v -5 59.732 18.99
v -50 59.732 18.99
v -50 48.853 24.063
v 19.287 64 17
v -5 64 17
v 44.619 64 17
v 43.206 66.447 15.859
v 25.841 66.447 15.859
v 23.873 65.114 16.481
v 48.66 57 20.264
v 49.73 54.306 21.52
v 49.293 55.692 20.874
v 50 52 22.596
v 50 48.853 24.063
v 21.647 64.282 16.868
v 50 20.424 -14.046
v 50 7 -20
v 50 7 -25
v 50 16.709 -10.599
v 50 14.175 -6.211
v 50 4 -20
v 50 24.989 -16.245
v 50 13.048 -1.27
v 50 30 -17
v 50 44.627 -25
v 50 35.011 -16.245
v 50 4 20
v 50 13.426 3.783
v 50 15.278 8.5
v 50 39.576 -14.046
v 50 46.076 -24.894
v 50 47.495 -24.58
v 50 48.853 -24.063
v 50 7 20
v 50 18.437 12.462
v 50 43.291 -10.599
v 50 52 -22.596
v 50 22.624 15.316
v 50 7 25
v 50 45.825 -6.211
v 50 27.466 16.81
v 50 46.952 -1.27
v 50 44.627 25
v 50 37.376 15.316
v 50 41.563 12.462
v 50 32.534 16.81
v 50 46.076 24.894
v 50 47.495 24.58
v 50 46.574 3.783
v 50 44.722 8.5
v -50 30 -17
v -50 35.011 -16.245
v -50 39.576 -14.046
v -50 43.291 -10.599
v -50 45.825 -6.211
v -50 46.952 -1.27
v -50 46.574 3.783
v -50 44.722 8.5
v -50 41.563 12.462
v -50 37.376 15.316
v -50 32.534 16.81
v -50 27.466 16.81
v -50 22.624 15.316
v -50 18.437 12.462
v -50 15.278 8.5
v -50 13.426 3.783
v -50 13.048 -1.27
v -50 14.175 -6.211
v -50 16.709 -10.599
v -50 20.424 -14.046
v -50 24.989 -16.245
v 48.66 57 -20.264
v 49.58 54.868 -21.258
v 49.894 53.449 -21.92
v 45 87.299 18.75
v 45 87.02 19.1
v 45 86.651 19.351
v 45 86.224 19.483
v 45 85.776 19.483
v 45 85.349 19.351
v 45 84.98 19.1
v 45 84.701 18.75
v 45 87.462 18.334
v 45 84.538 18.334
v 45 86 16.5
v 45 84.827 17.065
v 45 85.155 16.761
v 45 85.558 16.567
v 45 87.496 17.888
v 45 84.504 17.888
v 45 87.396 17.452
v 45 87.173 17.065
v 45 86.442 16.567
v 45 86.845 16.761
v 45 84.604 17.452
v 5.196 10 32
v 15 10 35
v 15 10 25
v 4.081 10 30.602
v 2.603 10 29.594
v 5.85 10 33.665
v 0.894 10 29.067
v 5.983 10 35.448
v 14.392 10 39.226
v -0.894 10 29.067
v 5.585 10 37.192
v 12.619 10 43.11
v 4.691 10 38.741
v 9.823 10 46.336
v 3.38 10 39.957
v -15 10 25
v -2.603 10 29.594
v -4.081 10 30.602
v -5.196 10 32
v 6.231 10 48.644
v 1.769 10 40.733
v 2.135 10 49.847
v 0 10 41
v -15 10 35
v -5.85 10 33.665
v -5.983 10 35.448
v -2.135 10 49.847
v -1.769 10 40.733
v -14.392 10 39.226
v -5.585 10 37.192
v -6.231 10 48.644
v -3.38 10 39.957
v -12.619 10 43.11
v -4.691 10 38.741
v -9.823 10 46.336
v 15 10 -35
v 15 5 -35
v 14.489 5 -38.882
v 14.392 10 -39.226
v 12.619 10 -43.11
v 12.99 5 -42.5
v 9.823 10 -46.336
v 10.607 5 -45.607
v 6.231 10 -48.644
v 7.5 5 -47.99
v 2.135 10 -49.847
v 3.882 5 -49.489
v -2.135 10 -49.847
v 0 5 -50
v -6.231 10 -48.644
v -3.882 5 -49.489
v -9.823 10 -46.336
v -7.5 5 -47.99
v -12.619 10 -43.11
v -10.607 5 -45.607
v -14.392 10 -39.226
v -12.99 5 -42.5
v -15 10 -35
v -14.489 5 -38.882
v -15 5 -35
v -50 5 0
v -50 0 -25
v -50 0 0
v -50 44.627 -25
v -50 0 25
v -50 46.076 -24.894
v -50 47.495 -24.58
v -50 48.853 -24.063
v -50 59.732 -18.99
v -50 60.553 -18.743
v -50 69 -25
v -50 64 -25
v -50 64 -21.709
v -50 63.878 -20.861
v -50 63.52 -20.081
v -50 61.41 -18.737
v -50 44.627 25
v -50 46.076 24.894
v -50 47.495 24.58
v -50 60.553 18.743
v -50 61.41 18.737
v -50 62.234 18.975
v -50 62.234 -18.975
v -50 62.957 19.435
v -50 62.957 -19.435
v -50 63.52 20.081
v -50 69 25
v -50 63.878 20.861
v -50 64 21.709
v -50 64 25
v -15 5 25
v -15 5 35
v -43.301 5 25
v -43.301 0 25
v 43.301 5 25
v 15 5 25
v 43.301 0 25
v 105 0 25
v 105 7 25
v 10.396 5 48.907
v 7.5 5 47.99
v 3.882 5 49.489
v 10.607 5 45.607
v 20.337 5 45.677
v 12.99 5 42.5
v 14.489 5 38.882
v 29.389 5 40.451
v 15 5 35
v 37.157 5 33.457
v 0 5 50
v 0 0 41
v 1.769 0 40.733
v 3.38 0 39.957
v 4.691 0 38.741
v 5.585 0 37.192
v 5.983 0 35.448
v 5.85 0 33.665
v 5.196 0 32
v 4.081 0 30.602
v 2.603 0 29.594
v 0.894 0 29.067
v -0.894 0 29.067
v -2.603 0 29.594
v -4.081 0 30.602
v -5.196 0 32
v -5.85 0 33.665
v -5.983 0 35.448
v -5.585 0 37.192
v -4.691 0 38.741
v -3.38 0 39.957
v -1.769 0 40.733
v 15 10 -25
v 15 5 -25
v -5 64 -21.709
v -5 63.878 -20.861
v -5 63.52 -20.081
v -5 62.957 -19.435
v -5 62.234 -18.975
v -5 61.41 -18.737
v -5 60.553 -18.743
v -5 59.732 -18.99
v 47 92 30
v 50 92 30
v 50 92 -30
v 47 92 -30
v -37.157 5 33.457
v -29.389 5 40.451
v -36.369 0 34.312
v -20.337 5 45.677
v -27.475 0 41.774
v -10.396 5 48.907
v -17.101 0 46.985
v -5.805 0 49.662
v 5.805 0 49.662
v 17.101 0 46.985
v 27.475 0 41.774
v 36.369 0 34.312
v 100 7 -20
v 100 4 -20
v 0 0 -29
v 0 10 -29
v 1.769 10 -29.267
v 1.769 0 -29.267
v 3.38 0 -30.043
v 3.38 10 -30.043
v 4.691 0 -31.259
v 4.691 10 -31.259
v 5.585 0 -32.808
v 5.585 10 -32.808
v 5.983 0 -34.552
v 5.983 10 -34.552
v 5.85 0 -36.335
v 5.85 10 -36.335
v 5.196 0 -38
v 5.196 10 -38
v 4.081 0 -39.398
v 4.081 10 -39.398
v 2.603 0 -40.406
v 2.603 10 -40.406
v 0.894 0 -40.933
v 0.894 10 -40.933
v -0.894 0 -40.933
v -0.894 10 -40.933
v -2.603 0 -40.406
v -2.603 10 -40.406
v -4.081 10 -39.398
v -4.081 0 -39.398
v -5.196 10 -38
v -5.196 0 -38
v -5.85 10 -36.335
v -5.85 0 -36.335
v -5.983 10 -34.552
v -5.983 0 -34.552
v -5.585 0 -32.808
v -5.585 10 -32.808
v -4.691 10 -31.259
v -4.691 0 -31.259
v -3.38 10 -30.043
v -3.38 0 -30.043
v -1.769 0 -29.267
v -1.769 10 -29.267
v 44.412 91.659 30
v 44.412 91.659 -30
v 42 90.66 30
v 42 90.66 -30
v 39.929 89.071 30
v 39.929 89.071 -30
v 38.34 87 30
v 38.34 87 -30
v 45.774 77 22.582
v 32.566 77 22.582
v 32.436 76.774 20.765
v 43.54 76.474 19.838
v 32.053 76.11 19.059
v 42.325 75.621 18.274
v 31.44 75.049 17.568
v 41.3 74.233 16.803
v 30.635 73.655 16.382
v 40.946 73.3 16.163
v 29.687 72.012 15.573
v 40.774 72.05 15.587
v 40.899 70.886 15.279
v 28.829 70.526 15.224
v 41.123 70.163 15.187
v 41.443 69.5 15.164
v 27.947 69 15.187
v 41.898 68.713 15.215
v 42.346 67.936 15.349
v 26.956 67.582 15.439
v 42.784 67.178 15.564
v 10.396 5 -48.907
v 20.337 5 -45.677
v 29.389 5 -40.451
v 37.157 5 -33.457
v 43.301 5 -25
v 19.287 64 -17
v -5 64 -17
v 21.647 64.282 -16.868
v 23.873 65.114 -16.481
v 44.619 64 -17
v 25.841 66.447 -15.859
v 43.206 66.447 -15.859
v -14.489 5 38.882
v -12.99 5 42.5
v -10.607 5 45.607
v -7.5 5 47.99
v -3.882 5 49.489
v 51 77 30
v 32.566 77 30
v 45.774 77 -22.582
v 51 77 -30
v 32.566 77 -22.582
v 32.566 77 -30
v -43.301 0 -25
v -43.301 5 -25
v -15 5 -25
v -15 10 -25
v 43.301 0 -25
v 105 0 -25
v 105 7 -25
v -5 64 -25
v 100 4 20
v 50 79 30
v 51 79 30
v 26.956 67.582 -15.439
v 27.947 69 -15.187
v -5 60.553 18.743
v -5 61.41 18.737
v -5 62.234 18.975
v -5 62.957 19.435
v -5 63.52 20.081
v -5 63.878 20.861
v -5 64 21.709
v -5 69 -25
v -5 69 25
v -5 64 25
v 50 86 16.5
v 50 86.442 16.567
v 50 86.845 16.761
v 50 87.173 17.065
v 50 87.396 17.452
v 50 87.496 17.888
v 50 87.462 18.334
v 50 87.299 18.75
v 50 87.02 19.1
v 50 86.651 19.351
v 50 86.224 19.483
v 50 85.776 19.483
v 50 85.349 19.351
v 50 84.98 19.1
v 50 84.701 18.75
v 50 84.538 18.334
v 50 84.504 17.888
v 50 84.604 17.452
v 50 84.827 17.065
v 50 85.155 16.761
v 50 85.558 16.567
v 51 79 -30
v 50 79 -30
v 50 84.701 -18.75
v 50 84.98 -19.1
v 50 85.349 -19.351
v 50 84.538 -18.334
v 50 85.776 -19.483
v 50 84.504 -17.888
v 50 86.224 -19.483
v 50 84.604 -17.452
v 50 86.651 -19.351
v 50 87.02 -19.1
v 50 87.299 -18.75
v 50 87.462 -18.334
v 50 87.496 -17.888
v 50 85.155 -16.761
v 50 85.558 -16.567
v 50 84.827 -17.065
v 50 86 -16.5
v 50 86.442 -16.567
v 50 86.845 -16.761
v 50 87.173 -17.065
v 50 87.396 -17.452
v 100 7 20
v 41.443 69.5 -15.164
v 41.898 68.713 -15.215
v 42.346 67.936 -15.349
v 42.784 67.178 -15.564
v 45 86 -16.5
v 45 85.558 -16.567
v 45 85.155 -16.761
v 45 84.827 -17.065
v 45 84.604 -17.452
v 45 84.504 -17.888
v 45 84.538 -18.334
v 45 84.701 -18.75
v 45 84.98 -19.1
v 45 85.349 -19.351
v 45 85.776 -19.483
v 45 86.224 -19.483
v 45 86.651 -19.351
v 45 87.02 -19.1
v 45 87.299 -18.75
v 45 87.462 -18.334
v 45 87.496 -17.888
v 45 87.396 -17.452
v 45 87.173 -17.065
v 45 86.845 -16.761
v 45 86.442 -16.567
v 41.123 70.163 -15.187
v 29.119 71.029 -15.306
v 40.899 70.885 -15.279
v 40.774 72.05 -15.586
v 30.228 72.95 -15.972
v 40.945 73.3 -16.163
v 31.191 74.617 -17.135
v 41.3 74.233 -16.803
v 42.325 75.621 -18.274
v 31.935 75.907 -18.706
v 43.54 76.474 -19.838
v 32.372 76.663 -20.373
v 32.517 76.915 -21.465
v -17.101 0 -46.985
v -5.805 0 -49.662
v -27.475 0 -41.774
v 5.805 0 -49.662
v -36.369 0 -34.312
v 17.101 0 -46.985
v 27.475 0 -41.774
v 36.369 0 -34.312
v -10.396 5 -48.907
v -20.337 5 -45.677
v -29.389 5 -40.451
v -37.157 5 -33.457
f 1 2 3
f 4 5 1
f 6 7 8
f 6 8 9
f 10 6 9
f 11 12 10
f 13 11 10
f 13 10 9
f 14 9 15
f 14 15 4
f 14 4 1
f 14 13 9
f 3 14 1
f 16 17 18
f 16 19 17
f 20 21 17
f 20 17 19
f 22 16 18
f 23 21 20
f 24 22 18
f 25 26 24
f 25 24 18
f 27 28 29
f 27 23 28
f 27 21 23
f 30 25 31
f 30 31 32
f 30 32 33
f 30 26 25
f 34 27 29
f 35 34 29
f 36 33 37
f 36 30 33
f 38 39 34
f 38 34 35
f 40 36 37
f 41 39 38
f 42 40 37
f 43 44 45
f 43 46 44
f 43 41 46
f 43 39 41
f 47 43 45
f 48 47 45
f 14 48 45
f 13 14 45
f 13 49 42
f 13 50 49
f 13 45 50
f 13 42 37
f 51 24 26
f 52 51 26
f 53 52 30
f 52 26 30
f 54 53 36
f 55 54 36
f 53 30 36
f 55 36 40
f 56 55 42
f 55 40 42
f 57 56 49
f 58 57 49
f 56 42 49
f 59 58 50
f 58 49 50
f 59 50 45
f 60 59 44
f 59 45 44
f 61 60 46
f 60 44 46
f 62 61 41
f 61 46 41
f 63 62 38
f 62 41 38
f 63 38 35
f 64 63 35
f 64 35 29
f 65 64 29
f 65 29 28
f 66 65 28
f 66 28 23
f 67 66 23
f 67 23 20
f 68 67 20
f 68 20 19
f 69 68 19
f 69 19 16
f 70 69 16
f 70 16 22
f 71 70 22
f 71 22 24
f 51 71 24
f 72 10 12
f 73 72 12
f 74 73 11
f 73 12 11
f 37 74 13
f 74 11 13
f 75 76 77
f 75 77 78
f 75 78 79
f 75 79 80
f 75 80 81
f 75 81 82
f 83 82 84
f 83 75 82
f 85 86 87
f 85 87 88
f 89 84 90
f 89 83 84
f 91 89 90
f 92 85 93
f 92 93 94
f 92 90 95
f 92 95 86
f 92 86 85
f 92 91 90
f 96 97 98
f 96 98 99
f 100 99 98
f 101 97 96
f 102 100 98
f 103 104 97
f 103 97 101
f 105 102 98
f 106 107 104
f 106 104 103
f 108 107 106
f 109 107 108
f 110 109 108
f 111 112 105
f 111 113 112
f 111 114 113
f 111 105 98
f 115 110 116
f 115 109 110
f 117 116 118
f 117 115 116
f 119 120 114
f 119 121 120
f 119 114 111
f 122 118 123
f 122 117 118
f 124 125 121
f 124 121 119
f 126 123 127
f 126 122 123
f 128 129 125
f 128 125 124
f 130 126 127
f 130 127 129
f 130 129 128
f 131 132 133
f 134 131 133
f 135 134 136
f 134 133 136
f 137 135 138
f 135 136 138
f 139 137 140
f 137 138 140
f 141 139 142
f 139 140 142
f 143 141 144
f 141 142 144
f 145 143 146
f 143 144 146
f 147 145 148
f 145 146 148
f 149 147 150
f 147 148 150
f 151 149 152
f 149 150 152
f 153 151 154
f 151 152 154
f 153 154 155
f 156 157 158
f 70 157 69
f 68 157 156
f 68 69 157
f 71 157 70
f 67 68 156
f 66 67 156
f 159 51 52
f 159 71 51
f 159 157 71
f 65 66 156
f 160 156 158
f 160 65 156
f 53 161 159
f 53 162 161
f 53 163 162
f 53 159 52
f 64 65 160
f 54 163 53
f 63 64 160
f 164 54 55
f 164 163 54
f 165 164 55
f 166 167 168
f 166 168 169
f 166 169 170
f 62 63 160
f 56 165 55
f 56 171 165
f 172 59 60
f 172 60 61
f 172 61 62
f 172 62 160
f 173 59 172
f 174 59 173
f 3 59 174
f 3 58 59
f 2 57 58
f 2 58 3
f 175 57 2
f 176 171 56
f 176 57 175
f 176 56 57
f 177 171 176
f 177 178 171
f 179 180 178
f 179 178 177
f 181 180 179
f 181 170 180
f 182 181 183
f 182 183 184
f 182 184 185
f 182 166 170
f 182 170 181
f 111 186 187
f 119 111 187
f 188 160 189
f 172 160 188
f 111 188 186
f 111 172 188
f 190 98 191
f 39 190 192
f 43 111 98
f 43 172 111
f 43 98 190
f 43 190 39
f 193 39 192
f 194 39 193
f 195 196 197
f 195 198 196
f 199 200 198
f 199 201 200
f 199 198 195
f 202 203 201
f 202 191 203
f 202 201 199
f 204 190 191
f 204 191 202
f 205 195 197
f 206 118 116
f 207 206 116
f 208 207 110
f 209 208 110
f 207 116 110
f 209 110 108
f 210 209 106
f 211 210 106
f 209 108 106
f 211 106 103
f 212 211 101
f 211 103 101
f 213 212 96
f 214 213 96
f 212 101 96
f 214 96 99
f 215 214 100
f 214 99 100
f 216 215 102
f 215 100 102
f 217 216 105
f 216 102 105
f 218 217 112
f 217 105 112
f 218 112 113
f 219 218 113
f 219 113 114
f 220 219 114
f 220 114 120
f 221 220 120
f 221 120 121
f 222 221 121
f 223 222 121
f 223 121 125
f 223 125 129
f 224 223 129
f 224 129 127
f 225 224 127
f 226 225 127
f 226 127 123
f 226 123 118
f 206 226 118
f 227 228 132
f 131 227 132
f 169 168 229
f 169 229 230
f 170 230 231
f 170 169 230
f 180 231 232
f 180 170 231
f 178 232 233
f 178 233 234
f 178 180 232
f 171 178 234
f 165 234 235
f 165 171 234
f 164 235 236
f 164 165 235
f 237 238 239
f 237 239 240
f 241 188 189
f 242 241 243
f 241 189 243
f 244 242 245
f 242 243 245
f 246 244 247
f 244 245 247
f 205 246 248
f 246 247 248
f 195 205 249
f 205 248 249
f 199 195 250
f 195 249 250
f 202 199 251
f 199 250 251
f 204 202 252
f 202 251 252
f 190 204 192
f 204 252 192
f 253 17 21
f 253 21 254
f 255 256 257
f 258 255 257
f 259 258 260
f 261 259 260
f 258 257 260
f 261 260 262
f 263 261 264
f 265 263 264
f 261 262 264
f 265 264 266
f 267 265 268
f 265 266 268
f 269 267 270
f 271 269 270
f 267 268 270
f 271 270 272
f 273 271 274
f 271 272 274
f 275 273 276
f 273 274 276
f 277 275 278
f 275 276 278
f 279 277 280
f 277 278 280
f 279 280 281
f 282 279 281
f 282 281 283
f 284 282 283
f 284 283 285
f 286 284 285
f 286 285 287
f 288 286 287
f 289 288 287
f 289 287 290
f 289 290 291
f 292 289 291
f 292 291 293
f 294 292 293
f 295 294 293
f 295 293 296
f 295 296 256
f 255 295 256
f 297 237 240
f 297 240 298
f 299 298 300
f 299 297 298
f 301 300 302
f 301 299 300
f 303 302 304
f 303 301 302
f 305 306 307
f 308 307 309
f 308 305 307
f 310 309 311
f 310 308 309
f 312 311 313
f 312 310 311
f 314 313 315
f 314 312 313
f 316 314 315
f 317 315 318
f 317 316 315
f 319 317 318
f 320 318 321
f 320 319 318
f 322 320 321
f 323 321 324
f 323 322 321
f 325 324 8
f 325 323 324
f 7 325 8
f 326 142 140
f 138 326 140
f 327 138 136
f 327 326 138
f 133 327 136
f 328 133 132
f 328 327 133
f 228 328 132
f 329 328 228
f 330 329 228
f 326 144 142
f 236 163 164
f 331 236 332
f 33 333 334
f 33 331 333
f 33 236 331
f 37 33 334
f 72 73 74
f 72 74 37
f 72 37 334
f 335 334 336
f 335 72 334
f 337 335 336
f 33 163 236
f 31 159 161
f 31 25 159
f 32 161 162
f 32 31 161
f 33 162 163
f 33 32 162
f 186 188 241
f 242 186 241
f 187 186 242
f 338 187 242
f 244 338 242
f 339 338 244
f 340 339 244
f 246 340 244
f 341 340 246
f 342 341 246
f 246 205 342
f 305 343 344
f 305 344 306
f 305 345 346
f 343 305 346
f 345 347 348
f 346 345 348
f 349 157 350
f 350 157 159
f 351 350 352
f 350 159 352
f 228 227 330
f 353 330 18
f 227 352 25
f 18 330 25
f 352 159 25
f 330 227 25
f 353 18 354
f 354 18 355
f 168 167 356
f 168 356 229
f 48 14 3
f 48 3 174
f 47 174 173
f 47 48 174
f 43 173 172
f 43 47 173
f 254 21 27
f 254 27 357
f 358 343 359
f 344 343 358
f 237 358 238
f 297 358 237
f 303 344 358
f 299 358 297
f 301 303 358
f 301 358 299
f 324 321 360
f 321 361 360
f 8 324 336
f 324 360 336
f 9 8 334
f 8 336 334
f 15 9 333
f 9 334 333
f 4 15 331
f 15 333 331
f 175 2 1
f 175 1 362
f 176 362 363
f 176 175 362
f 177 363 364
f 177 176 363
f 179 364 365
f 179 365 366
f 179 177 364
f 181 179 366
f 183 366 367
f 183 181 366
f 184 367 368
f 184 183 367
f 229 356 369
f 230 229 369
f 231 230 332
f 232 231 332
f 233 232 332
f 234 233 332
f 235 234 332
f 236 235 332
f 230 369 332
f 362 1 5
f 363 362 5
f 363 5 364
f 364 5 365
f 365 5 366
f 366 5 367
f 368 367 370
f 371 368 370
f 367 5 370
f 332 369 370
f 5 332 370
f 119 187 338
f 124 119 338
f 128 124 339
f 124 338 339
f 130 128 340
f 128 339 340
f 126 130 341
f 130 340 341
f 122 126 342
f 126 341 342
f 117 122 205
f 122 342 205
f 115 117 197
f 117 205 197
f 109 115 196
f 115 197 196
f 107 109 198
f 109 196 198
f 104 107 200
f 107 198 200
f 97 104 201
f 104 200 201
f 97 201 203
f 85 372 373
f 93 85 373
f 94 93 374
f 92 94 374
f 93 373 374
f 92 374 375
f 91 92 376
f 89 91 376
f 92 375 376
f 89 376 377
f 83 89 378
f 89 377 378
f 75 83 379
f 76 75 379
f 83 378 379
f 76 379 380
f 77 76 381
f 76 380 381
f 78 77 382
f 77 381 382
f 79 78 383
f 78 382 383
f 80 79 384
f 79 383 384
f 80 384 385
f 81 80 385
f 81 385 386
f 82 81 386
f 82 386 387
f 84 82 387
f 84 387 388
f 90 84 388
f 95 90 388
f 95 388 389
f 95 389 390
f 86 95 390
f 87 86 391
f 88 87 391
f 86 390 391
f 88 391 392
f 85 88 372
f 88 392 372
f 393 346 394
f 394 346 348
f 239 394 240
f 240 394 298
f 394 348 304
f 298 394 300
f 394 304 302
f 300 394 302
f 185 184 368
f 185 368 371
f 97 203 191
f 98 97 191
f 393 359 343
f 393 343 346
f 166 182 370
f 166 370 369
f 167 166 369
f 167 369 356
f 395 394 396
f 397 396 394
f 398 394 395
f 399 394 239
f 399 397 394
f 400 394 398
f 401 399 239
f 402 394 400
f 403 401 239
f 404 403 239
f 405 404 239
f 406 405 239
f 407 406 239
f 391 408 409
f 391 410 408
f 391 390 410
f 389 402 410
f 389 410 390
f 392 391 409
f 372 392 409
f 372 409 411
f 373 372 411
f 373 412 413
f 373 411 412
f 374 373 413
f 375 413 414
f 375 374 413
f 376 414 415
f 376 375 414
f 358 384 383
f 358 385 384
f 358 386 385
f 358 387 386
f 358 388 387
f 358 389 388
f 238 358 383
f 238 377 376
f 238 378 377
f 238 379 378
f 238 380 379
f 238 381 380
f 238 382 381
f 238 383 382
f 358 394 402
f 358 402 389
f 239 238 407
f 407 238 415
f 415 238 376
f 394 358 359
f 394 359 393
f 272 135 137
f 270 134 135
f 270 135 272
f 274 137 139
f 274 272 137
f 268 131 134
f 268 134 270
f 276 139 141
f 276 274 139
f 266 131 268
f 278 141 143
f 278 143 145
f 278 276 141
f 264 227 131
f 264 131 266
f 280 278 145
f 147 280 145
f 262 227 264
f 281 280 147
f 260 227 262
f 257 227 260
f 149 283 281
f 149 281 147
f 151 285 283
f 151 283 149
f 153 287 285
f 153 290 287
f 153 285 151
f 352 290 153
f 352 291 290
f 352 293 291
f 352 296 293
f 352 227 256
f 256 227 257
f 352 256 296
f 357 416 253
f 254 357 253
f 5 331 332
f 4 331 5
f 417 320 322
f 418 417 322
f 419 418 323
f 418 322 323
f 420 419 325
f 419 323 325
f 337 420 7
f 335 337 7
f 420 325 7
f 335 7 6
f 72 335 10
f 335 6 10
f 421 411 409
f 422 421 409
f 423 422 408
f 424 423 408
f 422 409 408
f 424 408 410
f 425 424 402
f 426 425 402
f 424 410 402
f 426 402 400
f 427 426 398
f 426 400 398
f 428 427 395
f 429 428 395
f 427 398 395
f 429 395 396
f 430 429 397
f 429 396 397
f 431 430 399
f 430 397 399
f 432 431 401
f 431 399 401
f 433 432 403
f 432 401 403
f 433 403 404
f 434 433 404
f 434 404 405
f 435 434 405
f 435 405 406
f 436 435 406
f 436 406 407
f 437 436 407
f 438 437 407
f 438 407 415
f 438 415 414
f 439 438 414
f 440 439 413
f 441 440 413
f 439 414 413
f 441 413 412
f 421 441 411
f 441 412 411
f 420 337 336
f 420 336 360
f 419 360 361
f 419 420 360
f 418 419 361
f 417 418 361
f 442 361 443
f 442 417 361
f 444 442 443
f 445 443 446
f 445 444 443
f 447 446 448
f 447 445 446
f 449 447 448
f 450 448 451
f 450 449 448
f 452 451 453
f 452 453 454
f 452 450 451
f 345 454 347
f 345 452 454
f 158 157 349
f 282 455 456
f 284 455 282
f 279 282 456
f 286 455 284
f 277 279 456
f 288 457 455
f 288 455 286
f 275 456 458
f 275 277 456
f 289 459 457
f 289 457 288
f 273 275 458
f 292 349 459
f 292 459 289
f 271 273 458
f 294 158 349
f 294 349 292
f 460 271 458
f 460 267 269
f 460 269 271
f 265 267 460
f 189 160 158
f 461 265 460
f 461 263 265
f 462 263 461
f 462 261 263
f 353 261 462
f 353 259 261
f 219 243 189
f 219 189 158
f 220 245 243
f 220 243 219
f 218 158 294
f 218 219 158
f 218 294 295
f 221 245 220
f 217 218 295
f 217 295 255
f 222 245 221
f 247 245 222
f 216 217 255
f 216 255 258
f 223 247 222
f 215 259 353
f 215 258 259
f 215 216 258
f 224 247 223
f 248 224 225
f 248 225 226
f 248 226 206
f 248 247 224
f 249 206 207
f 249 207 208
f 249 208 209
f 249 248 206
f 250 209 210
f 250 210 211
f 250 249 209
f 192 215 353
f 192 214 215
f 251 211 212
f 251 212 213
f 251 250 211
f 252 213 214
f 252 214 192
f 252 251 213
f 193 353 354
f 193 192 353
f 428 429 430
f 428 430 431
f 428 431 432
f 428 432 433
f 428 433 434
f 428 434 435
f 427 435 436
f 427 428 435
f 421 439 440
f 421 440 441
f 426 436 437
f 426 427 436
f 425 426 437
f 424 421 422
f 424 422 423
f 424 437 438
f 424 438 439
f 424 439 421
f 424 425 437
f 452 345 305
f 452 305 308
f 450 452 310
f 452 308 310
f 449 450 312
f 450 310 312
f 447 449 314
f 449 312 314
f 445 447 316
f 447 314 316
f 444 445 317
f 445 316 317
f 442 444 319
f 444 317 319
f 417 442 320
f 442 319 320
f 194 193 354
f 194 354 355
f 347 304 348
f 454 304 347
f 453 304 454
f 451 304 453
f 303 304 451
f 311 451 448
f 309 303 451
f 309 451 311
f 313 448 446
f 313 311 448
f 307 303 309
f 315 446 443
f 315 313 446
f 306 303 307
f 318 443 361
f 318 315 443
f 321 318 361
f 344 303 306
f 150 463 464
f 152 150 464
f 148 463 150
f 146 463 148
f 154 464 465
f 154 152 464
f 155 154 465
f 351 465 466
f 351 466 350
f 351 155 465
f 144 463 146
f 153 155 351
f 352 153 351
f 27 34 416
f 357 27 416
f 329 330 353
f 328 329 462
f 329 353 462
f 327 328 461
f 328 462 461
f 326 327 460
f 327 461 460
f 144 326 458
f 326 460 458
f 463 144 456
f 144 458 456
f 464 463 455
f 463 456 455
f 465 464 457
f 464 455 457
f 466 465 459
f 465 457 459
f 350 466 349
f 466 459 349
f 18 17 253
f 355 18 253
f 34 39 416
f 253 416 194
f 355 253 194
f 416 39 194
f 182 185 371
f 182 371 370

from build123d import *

# Parameters (mm, degrees)
SKETCH17_R          = 50
BOSS_EXTRUDE9_DEPTH = 5
BOSS_EXTRUDE1_DEPTH = 5
SKETCH3_R           = 6
CUT_EXTRUDE1_DEPTH  = 11
BOSS_EXTRUDE3_DEPTH = 50
BOSS_EXTRUDE7_DEPTH = 45
SKETCH6_W           = 55
SKETCH6_H           = 7
BOSS_EXTRUDE4_DEPTH = 50
BOSS_EXTRUDE5_DEPTH = 30
CUT_EXTRUDE2_DEPTH  = 81
CUT_EXTRUDE4_REACH  = 102
SKETCH12_W          = 60
SKETCH12_H          = 2
BOSS_EXTRUDE6_DEPTH = 1
SKETCH14_R          = 17
CUT_EXTRUDE7_DEPTH  = 101
SKETCH15_R          = 1.5
CUT_EXTRUDE8_DEPTH  = 5
SKETCH18_W          = 50
SKETCH18_H          = 40
CUT_EXTRUDE9_DEPTH  = 3
FILLET1_R           = 10


with BuildPart() as part:
    # Sketch17 → Boss-Extrude9 (new body)
    with BuildSketch(Plane(origin=(0, 0, 0), x_dir=(1, 0, 0), z_dir=(0, 1, 0))):
        with Locations(Location((0, 0, 0), (0, 0, 270))):  # turned: the seam where the file's is
            Circle(SKETCH17_R)
    extrude(amount=BOSS_EXTRUDE9_DEPTH)

    # Sketch2 → Boss-Extrude1 (add)
    with BuildSketch(Plane.XZ.offset(-5)):
        with BuildLine():
            Line((-15, -35), (-15, 35))
            ThreePointArc((-15, 35), (0, 50), (15, 35))
            Line((15, 35), (15, -35))
            ThreePointArc((15, -35), (0, -50), (-15, -35))
        make_face()
    extrude(amount=-BOSS_EXTRUDE1_DEPTH)

    # Sketch3 → Cut-Extrude1 (cut, through all)
    with BuildSketch(Plane(origin=(0, 10, 0), x_dir=(1, 0, 0), z_dir=(0, 1, 0))):
        with Locations(Location((0, 35, 0), (0, 0, 270))):  # turned: the seam where the file's is
            Circle(SKETCH3_R)
        with Locations(Location((0, -35, 0), (0, 0, 270))):  # turned: the seam where the file's is
            Circle(SKETCH3_R)
    extrude(amount=-CUT_EXTRUDE1_DEPTH, mode=Mode.SUBTRACT)

    # Sketch5 → Boss-Extrude3 (add, symmetric)
    with BuildSketch(Plane(origin=(0, 0, 0), x_dir=(0, 0, -1), z_dir=(1, 0, 0))):
        with BuildLine():
            Line((17, 64), (-17, 64))
            Line((-17, 64), (-24.06307787, 48.853180627))
            ThreePointArc((-24.06307787, 48.853180627), (-24.762960071, 46.791394149), (-25, 44.626998009))
            Line((-25, 44.626998009), (-25, 0))
            Line((-25, 0), (25, 0))
            Line((25, 0), (25, 44.626998009))
            ThreePointArc((25, 44.626998009), (24.762960071, 46.791394149), (24.06307787, 48.853180627))
            Line((24.06307787, 48.853180627), (17, 64))
        make_face()
    extrude(amount=BOSS_EXTRUDE3_DEPTH, both=True)

    # Sketch4 → Boss-Extrude7 (add)
    with BuildSketch(Plane(origin=(-50, 0, 0), x_dir=(0, 0, -1), z_dir=(1, 0, 0))):
        with BuildLine():
            Line((-17, 64), (-18.99013337, 59.732145215))
            ThreePointArc((-18.99013337, 59.732145215), (-19.178882394, 62.611898825), (-21.709056731, 64))
            Line((-21.709056731, 64), (-25, 64))
            Line((-25, 64), (-25, 69))
            Line((-25, 69), (25, 69))
            Line((25, 69), (25, 64))
            Line((25, 64), (21.709056731, 64))
            ThreePointArc((21.709056731, 64), (19.178882394, 62.611898825), (18.99013337, 59.732145215))
            Line((18.99013337, 59.732145215), (17, 64))
            Line((17, 64), (-17, 64))
        make_face()
    extrude(amount=BOSS_EXTRUDE7_DEPTH)

    # Sketch6 → Boss-Extrude4 (add)
    with BuildSketch(Plane.XY.offset(25)):
        with Locations((77.5, 3.5)):
            Rectangle(SKETCH6_W, SKETCH6_H)
    extrude(amount=-BOSS_EXTRUDE4_DEPTH)

    # Sketch7 → Boss-Extrude5 (add, symmetric)
    with BuildSketch(Plane.XY):
        with BuildLine():
            Line((50, 64), (50, 92))
            Line((50, 92), (47, 92))
            ThreePointArc((47, 92), (42, 90.660254038), (38.339745962, 87))
            Line((38.339745962, 87), (25.060689771, 64))
            Line((25.060689771, 64), (50, 64))
        make_face()
    extrude(amount=BOSS_EXTRUDE5_DEPTH, both=True)

    # Sketch8 → Cut-Extrude2 (cut, through all)
    with BuildSketch(Plane.XY.offset(30)):
        with BuildLine():
            Line((50, 52), (50, 77))
            Line((50, 77), (45.773502692, 77))
            ThreePointArc((45.773502692, 77), (41.443375673, 74.5), (41.443375673, 69.5))
            Line((41.443375673, 69.5), (48.660254038, 57))
            ThreePointArc((48.660254038, 57), (49.659258263, 54.588190451), (50, 52))
        make_face()
    extrude(amount=-CUT_EXTRUDE2_DEPTH, mode=Mode.SUBTRACT)

    # Sketch10 → Cut-Extrude4 (cut, up to next)
    with BuildSketch(Plane(origin=(50, 0, 0), x_dir=(0, 0, -1), z_dir=(1, 0, 0)), mode=Mode.PRIVATE) as cut_extrude4_sk1:
        with BuildLine():
            Line((30, 77), (30, 36.121410033))
            Line((30, 36.121410033), (15.858955464, 66.446977905))
            ThreePointArc((15.858955464, 66.446977905), (16.325670644, 73.56767554), (22.581972002, 77))
            Line((22.581972002, 77), (30, 77))
        make_face()
    cut_extrude4_tool1 = extrude(cut_extrude4_sk1.sketch, amount=-CUT_EXTRUDE4_REACH, mode=Mode.PRIVATE) & part.part
    add(cut_extrude4_tool1.solids().sort_by_distance((50, 62.410473, -24.403719))[0], mode=Mode.SUBTRACT)
    # Sketch10 → Cut-Extrude4 (cut, up to next)
    with BuildSketch(Plane(origin=(50, 0, 0), x_dir=(0, 0, -1), z_dir=(1, 0, 0)), mode=Mode.PRIVATE) as cut_extrude4_sk2:
        with BuildLine():
            Line((-30, 77), (-22.581972002, 77))
            ThreePointArc((-22.581972002, 77), (-16.325670644, 73.56767554), (-15.858955464, 66.446977905))
            Line((-15.858955464, 66.446977905), (-30, 36.121410033))
            Line((-30, 36.121410033), (-30, 77))
        make_face()
    cut_extrude4_tool2 = extrude(cut_extrude4_sk2.sketch, amount=-CUT_EXTRUDE4_REACH, mode=Mode.PRIVATE) & part.part
    add(cut_extrude4_tool2.solids().sort_by_distance((50, 62.410473, 24.403719))[0], mode=Mode.SUBTRACT)

    # Sketch12 → Boss-Extrude6 (add)
    with BuildSketch(Plane(origin=(50, 0, 0), x_dir=(0, 0, -1), z_dir=(1, 0, 0))):
        with Locations((0, 78)):
            Rectangle(SKETCH12_W, SKETCH12_H)
    extrude(amount=BOSS_EXTRUDE6_DEPTH)

    # Sketch14 → Cut-Extrude7 (cut, through all)
    with BuildSketch(Plane(origin=(50, 0, 0), x_dir=(0, 0, -1), z_dir=(1, 0, 0))):
        with Locations((0, 30)):
            Circle(SKETCH14_R)
    extrude(amount=-CUT_EXTRUDE7_DEPTH, mode=Mode.SUBTRACT)

    # Sketch15 → Cut-Extrude8 (cut)
    with BuildSketch(Plane(origin=(50, 0, 0), x_dir=(0, 0, -1), z_dir=(1, 0, 0))):
        with Locations((-18, 86)):
            Circle(SKETCH15_R)
        with Locations(Location((18, 86, 0), (0, 0, 180))):  # turned: the seam where the file's is
            Circle(SKETCH15_R)
    extrude(amount=-CUT_EXTRUDE8_DEPTH, mode=Mode.SUBTRACT)

    # Sketch18 → Cut-Extrude9 (cut)
    with BuildSketch(Plane(origin=(0, 7, 0), x_dir=(1, 0, 0), z_dir=(0, 1, 0))):
        with Locations((75, 0)):
            Rectangle(SKETCH18_W, SKETCH18_H)
    extrude(amount=-CUT_EXTRUDE9_DEPTH, mode=Mode.SUBTRACT)

    # Fillet1
    fillet1_edges = [part.edges().sort_by_distance(p)[0] for p in [
        (25.060689771, 64, 0),
    ]]
    fillet(fillet1_edges, radius=FILLET1_R)


solid = part.part
